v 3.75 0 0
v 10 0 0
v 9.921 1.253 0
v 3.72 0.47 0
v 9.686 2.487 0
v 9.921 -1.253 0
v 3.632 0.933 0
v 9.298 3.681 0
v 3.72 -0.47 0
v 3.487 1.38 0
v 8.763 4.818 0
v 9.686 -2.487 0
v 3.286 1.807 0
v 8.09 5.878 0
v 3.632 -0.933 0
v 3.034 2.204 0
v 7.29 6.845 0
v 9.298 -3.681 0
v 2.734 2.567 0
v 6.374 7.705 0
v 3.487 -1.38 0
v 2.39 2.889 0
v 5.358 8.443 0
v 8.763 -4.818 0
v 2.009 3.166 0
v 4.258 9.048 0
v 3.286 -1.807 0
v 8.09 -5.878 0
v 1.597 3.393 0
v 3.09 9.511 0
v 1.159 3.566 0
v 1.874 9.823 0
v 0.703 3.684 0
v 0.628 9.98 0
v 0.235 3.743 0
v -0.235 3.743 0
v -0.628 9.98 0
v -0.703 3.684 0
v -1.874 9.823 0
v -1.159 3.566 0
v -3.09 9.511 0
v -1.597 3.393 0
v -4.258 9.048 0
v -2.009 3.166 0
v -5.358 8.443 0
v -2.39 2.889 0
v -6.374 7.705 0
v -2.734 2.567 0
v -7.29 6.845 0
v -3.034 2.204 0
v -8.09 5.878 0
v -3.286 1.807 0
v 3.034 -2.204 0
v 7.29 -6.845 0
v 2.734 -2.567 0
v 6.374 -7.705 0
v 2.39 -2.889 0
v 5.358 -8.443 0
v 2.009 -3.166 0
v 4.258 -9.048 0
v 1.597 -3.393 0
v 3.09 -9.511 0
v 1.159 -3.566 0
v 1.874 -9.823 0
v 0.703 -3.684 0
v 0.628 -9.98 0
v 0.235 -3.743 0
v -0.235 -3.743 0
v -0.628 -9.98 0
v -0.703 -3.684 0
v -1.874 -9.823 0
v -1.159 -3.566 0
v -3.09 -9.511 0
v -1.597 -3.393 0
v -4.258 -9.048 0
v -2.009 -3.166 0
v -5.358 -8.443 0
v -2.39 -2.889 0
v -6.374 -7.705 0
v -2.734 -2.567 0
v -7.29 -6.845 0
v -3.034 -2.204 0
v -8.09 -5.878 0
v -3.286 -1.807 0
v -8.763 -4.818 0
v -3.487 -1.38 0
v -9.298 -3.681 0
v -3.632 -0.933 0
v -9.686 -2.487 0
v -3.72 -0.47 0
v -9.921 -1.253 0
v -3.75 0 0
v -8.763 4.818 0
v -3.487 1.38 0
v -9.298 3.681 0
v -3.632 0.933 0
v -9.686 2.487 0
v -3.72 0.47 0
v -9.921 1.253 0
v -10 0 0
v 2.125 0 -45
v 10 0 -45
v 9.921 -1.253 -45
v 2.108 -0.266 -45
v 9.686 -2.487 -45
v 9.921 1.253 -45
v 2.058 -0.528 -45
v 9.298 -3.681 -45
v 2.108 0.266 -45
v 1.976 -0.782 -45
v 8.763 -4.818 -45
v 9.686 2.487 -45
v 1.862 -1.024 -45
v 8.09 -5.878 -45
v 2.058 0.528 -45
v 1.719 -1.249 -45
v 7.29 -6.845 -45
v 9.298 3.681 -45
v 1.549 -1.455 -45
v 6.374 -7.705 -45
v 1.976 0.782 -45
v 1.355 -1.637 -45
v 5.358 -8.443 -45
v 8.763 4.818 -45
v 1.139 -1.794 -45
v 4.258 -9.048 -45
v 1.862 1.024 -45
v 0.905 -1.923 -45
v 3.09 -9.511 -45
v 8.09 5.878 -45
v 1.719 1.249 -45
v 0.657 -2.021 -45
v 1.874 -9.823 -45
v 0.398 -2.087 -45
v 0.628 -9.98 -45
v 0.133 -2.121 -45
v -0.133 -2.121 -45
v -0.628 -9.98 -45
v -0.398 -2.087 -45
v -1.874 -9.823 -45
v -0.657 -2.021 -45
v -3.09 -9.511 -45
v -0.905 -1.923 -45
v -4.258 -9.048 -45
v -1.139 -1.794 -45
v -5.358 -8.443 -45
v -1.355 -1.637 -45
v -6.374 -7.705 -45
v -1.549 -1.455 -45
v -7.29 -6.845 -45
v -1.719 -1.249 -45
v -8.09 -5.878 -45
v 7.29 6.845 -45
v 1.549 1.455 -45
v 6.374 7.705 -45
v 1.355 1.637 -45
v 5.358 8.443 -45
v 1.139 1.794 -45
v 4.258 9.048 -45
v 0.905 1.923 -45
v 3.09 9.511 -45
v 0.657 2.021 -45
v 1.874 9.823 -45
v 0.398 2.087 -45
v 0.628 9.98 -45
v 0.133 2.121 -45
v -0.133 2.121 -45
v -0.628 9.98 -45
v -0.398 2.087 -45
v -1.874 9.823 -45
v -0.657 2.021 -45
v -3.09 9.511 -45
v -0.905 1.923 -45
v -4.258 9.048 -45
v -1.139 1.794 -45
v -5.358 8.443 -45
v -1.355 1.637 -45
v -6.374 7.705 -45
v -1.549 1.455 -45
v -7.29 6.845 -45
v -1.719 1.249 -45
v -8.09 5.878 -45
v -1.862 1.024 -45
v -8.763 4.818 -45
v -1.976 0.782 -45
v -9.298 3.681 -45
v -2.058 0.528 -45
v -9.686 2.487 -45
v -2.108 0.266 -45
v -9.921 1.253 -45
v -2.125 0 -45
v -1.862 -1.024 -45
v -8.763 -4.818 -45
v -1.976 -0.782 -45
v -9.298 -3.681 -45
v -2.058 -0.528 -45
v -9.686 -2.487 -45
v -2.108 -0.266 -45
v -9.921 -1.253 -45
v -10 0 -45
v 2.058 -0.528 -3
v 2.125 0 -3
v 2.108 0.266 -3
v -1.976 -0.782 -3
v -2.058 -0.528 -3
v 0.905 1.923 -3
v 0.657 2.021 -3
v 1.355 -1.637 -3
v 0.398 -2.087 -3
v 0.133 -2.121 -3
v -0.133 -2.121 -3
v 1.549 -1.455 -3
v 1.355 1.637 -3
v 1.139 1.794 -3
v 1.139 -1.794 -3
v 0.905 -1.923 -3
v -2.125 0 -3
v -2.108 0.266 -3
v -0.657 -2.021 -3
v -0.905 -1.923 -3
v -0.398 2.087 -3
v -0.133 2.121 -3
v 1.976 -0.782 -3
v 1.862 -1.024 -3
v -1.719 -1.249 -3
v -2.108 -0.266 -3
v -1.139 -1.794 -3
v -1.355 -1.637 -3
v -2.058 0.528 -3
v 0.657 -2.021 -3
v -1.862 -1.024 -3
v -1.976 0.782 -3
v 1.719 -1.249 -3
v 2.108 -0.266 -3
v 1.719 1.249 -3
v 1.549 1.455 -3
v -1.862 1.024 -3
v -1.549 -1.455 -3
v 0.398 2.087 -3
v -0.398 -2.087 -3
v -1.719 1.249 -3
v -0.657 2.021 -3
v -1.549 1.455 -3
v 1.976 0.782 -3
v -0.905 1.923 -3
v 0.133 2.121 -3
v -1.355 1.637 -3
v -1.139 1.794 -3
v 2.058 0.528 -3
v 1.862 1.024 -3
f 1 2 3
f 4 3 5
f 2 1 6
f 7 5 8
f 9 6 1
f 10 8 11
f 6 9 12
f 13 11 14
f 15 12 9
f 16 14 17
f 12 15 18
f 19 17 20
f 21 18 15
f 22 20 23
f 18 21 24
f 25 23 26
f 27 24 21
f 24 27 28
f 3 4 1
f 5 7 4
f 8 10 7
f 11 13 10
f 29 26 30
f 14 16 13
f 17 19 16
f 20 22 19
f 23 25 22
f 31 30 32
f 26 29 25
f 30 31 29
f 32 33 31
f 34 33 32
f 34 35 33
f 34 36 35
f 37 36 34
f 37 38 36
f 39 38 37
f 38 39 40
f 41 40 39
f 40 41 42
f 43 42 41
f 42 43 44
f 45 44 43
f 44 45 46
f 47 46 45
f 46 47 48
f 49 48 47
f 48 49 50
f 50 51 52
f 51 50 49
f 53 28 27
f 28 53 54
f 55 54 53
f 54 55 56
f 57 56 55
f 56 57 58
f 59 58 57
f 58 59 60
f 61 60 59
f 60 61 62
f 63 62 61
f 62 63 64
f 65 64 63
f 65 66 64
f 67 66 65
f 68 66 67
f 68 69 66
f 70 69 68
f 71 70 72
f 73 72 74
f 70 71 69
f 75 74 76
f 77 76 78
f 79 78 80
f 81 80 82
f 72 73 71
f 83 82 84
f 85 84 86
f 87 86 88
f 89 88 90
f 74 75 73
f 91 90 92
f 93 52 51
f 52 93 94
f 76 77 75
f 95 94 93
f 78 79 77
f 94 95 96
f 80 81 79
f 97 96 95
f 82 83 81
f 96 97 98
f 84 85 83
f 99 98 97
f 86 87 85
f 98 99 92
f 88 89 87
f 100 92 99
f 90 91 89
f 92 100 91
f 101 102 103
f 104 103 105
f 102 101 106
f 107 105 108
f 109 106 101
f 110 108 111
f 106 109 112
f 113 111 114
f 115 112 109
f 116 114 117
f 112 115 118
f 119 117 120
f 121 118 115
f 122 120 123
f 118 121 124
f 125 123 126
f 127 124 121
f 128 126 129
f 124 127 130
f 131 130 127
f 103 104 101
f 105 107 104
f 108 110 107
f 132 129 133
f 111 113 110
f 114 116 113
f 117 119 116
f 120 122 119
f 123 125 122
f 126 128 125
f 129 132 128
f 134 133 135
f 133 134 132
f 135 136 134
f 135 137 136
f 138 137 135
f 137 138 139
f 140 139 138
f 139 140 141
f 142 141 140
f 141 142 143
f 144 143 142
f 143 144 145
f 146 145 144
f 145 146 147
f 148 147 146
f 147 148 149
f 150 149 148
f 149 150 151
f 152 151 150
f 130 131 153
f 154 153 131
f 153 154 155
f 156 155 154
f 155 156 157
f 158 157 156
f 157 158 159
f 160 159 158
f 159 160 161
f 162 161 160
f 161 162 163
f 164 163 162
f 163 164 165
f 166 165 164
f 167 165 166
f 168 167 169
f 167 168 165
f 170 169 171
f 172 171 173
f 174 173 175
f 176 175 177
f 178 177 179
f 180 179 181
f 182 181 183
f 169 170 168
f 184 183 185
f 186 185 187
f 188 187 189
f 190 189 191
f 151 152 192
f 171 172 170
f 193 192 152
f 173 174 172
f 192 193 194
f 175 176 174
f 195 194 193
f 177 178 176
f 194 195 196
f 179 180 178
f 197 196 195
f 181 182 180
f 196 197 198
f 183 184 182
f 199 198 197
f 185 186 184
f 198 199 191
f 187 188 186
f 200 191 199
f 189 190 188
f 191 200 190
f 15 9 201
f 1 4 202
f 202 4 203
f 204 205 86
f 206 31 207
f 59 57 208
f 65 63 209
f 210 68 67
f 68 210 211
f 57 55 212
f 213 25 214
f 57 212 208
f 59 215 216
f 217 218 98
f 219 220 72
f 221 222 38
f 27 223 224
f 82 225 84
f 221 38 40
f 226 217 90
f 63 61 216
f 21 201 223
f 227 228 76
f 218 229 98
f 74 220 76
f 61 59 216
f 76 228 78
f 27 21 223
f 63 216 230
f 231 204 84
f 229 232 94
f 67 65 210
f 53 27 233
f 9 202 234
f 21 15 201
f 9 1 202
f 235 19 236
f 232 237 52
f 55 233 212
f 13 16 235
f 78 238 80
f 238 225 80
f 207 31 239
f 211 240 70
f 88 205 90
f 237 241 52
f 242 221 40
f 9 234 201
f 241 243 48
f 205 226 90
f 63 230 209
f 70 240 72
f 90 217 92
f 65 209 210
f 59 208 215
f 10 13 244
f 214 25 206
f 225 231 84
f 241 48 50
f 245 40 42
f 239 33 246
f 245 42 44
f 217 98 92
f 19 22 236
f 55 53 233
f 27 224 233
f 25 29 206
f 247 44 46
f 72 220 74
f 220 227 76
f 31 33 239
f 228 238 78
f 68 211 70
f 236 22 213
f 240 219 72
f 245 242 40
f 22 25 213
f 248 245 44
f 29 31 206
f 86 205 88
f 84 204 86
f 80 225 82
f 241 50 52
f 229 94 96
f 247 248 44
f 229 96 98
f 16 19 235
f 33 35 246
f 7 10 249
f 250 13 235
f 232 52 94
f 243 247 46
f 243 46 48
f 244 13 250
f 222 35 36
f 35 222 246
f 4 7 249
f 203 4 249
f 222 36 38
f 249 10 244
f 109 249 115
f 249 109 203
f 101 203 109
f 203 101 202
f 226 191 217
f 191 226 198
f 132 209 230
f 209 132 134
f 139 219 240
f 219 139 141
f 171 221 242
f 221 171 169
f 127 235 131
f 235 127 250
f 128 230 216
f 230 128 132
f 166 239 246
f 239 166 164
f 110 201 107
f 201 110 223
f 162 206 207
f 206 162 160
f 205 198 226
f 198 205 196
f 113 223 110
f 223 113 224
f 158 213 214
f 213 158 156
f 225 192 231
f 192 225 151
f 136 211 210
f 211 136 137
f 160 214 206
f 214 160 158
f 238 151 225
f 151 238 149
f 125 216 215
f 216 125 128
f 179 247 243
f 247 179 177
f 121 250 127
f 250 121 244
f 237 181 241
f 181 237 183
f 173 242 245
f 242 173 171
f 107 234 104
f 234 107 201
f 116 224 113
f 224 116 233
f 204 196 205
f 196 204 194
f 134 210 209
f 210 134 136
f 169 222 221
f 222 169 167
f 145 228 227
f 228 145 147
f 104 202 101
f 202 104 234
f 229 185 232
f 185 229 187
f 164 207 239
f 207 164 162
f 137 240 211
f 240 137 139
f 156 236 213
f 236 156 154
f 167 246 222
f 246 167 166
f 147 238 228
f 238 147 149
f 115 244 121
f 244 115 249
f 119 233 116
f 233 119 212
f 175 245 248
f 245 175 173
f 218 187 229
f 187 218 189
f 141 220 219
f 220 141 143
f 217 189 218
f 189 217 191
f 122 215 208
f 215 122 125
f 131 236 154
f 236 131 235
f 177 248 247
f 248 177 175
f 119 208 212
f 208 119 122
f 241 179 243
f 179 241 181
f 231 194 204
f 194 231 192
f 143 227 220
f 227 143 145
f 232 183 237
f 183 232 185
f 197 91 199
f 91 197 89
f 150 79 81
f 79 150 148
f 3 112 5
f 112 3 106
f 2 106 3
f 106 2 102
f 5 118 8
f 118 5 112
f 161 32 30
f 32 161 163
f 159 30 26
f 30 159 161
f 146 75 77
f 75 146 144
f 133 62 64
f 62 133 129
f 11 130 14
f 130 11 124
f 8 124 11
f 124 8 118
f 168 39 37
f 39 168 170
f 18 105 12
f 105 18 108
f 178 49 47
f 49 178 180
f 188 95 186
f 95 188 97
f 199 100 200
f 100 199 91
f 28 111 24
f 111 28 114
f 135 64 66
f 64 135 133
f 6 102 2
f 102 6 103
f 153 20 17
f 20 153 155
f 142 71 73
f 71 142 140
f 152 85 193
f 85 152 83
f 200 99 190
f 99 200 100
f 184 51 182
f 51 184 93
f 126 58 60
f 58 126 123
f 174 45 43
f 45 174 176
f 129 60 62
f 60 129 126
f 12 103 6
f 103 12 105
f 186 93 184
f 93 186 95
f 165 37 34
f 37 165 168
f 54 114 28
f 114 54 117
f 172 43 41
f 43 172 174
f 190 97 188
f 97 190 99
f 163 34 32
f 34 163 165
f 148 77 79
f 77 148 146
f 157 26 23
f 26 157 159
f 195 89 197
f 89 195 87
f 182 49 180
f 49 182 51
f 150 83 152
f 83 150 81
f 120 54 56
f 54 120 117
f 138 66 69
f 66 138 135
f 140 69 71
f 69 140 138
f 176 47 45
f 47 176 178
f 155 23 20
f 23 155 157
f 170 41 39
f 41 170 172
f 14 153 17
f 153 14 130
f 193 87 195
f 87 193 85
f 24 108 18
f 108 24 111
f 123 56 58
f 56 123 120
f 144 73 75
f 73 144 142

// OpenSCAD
$fn = 50;


difference() {
	union() {
		translate(v = [0, 0, -45.0000000000]) {
			cylinder(h = 45, r = 10.0000000000);
		}
		cylinder(h = 0, r = 19.0000000000);
	}
	union() {
		translate(v = [0, 0, 0]) {
			rotate(a = [0, 0, 0]) {
				difference() {
					union() {
						#translate(v = [0, 0, -45.0000000000]) {
							cylinder(h = 45, r = 2.0000000000);
						}
						#translate(v = [0, 0, -3]) {
							cylinder(h = 3, r1 = 2.1250000000, r2 = 3.7500000000);
						}
						#translate(v = [0, 0, -45.0000000000]) {
							cylinder(h = 45, r = 2.1250000000);
						}
						#translate(v = [0, 0, -45.0000000000]) {
							cylinder(h = 45, r = 2.0000000000);
						}
					}
					union();
				}
			}
		}
	}
}
